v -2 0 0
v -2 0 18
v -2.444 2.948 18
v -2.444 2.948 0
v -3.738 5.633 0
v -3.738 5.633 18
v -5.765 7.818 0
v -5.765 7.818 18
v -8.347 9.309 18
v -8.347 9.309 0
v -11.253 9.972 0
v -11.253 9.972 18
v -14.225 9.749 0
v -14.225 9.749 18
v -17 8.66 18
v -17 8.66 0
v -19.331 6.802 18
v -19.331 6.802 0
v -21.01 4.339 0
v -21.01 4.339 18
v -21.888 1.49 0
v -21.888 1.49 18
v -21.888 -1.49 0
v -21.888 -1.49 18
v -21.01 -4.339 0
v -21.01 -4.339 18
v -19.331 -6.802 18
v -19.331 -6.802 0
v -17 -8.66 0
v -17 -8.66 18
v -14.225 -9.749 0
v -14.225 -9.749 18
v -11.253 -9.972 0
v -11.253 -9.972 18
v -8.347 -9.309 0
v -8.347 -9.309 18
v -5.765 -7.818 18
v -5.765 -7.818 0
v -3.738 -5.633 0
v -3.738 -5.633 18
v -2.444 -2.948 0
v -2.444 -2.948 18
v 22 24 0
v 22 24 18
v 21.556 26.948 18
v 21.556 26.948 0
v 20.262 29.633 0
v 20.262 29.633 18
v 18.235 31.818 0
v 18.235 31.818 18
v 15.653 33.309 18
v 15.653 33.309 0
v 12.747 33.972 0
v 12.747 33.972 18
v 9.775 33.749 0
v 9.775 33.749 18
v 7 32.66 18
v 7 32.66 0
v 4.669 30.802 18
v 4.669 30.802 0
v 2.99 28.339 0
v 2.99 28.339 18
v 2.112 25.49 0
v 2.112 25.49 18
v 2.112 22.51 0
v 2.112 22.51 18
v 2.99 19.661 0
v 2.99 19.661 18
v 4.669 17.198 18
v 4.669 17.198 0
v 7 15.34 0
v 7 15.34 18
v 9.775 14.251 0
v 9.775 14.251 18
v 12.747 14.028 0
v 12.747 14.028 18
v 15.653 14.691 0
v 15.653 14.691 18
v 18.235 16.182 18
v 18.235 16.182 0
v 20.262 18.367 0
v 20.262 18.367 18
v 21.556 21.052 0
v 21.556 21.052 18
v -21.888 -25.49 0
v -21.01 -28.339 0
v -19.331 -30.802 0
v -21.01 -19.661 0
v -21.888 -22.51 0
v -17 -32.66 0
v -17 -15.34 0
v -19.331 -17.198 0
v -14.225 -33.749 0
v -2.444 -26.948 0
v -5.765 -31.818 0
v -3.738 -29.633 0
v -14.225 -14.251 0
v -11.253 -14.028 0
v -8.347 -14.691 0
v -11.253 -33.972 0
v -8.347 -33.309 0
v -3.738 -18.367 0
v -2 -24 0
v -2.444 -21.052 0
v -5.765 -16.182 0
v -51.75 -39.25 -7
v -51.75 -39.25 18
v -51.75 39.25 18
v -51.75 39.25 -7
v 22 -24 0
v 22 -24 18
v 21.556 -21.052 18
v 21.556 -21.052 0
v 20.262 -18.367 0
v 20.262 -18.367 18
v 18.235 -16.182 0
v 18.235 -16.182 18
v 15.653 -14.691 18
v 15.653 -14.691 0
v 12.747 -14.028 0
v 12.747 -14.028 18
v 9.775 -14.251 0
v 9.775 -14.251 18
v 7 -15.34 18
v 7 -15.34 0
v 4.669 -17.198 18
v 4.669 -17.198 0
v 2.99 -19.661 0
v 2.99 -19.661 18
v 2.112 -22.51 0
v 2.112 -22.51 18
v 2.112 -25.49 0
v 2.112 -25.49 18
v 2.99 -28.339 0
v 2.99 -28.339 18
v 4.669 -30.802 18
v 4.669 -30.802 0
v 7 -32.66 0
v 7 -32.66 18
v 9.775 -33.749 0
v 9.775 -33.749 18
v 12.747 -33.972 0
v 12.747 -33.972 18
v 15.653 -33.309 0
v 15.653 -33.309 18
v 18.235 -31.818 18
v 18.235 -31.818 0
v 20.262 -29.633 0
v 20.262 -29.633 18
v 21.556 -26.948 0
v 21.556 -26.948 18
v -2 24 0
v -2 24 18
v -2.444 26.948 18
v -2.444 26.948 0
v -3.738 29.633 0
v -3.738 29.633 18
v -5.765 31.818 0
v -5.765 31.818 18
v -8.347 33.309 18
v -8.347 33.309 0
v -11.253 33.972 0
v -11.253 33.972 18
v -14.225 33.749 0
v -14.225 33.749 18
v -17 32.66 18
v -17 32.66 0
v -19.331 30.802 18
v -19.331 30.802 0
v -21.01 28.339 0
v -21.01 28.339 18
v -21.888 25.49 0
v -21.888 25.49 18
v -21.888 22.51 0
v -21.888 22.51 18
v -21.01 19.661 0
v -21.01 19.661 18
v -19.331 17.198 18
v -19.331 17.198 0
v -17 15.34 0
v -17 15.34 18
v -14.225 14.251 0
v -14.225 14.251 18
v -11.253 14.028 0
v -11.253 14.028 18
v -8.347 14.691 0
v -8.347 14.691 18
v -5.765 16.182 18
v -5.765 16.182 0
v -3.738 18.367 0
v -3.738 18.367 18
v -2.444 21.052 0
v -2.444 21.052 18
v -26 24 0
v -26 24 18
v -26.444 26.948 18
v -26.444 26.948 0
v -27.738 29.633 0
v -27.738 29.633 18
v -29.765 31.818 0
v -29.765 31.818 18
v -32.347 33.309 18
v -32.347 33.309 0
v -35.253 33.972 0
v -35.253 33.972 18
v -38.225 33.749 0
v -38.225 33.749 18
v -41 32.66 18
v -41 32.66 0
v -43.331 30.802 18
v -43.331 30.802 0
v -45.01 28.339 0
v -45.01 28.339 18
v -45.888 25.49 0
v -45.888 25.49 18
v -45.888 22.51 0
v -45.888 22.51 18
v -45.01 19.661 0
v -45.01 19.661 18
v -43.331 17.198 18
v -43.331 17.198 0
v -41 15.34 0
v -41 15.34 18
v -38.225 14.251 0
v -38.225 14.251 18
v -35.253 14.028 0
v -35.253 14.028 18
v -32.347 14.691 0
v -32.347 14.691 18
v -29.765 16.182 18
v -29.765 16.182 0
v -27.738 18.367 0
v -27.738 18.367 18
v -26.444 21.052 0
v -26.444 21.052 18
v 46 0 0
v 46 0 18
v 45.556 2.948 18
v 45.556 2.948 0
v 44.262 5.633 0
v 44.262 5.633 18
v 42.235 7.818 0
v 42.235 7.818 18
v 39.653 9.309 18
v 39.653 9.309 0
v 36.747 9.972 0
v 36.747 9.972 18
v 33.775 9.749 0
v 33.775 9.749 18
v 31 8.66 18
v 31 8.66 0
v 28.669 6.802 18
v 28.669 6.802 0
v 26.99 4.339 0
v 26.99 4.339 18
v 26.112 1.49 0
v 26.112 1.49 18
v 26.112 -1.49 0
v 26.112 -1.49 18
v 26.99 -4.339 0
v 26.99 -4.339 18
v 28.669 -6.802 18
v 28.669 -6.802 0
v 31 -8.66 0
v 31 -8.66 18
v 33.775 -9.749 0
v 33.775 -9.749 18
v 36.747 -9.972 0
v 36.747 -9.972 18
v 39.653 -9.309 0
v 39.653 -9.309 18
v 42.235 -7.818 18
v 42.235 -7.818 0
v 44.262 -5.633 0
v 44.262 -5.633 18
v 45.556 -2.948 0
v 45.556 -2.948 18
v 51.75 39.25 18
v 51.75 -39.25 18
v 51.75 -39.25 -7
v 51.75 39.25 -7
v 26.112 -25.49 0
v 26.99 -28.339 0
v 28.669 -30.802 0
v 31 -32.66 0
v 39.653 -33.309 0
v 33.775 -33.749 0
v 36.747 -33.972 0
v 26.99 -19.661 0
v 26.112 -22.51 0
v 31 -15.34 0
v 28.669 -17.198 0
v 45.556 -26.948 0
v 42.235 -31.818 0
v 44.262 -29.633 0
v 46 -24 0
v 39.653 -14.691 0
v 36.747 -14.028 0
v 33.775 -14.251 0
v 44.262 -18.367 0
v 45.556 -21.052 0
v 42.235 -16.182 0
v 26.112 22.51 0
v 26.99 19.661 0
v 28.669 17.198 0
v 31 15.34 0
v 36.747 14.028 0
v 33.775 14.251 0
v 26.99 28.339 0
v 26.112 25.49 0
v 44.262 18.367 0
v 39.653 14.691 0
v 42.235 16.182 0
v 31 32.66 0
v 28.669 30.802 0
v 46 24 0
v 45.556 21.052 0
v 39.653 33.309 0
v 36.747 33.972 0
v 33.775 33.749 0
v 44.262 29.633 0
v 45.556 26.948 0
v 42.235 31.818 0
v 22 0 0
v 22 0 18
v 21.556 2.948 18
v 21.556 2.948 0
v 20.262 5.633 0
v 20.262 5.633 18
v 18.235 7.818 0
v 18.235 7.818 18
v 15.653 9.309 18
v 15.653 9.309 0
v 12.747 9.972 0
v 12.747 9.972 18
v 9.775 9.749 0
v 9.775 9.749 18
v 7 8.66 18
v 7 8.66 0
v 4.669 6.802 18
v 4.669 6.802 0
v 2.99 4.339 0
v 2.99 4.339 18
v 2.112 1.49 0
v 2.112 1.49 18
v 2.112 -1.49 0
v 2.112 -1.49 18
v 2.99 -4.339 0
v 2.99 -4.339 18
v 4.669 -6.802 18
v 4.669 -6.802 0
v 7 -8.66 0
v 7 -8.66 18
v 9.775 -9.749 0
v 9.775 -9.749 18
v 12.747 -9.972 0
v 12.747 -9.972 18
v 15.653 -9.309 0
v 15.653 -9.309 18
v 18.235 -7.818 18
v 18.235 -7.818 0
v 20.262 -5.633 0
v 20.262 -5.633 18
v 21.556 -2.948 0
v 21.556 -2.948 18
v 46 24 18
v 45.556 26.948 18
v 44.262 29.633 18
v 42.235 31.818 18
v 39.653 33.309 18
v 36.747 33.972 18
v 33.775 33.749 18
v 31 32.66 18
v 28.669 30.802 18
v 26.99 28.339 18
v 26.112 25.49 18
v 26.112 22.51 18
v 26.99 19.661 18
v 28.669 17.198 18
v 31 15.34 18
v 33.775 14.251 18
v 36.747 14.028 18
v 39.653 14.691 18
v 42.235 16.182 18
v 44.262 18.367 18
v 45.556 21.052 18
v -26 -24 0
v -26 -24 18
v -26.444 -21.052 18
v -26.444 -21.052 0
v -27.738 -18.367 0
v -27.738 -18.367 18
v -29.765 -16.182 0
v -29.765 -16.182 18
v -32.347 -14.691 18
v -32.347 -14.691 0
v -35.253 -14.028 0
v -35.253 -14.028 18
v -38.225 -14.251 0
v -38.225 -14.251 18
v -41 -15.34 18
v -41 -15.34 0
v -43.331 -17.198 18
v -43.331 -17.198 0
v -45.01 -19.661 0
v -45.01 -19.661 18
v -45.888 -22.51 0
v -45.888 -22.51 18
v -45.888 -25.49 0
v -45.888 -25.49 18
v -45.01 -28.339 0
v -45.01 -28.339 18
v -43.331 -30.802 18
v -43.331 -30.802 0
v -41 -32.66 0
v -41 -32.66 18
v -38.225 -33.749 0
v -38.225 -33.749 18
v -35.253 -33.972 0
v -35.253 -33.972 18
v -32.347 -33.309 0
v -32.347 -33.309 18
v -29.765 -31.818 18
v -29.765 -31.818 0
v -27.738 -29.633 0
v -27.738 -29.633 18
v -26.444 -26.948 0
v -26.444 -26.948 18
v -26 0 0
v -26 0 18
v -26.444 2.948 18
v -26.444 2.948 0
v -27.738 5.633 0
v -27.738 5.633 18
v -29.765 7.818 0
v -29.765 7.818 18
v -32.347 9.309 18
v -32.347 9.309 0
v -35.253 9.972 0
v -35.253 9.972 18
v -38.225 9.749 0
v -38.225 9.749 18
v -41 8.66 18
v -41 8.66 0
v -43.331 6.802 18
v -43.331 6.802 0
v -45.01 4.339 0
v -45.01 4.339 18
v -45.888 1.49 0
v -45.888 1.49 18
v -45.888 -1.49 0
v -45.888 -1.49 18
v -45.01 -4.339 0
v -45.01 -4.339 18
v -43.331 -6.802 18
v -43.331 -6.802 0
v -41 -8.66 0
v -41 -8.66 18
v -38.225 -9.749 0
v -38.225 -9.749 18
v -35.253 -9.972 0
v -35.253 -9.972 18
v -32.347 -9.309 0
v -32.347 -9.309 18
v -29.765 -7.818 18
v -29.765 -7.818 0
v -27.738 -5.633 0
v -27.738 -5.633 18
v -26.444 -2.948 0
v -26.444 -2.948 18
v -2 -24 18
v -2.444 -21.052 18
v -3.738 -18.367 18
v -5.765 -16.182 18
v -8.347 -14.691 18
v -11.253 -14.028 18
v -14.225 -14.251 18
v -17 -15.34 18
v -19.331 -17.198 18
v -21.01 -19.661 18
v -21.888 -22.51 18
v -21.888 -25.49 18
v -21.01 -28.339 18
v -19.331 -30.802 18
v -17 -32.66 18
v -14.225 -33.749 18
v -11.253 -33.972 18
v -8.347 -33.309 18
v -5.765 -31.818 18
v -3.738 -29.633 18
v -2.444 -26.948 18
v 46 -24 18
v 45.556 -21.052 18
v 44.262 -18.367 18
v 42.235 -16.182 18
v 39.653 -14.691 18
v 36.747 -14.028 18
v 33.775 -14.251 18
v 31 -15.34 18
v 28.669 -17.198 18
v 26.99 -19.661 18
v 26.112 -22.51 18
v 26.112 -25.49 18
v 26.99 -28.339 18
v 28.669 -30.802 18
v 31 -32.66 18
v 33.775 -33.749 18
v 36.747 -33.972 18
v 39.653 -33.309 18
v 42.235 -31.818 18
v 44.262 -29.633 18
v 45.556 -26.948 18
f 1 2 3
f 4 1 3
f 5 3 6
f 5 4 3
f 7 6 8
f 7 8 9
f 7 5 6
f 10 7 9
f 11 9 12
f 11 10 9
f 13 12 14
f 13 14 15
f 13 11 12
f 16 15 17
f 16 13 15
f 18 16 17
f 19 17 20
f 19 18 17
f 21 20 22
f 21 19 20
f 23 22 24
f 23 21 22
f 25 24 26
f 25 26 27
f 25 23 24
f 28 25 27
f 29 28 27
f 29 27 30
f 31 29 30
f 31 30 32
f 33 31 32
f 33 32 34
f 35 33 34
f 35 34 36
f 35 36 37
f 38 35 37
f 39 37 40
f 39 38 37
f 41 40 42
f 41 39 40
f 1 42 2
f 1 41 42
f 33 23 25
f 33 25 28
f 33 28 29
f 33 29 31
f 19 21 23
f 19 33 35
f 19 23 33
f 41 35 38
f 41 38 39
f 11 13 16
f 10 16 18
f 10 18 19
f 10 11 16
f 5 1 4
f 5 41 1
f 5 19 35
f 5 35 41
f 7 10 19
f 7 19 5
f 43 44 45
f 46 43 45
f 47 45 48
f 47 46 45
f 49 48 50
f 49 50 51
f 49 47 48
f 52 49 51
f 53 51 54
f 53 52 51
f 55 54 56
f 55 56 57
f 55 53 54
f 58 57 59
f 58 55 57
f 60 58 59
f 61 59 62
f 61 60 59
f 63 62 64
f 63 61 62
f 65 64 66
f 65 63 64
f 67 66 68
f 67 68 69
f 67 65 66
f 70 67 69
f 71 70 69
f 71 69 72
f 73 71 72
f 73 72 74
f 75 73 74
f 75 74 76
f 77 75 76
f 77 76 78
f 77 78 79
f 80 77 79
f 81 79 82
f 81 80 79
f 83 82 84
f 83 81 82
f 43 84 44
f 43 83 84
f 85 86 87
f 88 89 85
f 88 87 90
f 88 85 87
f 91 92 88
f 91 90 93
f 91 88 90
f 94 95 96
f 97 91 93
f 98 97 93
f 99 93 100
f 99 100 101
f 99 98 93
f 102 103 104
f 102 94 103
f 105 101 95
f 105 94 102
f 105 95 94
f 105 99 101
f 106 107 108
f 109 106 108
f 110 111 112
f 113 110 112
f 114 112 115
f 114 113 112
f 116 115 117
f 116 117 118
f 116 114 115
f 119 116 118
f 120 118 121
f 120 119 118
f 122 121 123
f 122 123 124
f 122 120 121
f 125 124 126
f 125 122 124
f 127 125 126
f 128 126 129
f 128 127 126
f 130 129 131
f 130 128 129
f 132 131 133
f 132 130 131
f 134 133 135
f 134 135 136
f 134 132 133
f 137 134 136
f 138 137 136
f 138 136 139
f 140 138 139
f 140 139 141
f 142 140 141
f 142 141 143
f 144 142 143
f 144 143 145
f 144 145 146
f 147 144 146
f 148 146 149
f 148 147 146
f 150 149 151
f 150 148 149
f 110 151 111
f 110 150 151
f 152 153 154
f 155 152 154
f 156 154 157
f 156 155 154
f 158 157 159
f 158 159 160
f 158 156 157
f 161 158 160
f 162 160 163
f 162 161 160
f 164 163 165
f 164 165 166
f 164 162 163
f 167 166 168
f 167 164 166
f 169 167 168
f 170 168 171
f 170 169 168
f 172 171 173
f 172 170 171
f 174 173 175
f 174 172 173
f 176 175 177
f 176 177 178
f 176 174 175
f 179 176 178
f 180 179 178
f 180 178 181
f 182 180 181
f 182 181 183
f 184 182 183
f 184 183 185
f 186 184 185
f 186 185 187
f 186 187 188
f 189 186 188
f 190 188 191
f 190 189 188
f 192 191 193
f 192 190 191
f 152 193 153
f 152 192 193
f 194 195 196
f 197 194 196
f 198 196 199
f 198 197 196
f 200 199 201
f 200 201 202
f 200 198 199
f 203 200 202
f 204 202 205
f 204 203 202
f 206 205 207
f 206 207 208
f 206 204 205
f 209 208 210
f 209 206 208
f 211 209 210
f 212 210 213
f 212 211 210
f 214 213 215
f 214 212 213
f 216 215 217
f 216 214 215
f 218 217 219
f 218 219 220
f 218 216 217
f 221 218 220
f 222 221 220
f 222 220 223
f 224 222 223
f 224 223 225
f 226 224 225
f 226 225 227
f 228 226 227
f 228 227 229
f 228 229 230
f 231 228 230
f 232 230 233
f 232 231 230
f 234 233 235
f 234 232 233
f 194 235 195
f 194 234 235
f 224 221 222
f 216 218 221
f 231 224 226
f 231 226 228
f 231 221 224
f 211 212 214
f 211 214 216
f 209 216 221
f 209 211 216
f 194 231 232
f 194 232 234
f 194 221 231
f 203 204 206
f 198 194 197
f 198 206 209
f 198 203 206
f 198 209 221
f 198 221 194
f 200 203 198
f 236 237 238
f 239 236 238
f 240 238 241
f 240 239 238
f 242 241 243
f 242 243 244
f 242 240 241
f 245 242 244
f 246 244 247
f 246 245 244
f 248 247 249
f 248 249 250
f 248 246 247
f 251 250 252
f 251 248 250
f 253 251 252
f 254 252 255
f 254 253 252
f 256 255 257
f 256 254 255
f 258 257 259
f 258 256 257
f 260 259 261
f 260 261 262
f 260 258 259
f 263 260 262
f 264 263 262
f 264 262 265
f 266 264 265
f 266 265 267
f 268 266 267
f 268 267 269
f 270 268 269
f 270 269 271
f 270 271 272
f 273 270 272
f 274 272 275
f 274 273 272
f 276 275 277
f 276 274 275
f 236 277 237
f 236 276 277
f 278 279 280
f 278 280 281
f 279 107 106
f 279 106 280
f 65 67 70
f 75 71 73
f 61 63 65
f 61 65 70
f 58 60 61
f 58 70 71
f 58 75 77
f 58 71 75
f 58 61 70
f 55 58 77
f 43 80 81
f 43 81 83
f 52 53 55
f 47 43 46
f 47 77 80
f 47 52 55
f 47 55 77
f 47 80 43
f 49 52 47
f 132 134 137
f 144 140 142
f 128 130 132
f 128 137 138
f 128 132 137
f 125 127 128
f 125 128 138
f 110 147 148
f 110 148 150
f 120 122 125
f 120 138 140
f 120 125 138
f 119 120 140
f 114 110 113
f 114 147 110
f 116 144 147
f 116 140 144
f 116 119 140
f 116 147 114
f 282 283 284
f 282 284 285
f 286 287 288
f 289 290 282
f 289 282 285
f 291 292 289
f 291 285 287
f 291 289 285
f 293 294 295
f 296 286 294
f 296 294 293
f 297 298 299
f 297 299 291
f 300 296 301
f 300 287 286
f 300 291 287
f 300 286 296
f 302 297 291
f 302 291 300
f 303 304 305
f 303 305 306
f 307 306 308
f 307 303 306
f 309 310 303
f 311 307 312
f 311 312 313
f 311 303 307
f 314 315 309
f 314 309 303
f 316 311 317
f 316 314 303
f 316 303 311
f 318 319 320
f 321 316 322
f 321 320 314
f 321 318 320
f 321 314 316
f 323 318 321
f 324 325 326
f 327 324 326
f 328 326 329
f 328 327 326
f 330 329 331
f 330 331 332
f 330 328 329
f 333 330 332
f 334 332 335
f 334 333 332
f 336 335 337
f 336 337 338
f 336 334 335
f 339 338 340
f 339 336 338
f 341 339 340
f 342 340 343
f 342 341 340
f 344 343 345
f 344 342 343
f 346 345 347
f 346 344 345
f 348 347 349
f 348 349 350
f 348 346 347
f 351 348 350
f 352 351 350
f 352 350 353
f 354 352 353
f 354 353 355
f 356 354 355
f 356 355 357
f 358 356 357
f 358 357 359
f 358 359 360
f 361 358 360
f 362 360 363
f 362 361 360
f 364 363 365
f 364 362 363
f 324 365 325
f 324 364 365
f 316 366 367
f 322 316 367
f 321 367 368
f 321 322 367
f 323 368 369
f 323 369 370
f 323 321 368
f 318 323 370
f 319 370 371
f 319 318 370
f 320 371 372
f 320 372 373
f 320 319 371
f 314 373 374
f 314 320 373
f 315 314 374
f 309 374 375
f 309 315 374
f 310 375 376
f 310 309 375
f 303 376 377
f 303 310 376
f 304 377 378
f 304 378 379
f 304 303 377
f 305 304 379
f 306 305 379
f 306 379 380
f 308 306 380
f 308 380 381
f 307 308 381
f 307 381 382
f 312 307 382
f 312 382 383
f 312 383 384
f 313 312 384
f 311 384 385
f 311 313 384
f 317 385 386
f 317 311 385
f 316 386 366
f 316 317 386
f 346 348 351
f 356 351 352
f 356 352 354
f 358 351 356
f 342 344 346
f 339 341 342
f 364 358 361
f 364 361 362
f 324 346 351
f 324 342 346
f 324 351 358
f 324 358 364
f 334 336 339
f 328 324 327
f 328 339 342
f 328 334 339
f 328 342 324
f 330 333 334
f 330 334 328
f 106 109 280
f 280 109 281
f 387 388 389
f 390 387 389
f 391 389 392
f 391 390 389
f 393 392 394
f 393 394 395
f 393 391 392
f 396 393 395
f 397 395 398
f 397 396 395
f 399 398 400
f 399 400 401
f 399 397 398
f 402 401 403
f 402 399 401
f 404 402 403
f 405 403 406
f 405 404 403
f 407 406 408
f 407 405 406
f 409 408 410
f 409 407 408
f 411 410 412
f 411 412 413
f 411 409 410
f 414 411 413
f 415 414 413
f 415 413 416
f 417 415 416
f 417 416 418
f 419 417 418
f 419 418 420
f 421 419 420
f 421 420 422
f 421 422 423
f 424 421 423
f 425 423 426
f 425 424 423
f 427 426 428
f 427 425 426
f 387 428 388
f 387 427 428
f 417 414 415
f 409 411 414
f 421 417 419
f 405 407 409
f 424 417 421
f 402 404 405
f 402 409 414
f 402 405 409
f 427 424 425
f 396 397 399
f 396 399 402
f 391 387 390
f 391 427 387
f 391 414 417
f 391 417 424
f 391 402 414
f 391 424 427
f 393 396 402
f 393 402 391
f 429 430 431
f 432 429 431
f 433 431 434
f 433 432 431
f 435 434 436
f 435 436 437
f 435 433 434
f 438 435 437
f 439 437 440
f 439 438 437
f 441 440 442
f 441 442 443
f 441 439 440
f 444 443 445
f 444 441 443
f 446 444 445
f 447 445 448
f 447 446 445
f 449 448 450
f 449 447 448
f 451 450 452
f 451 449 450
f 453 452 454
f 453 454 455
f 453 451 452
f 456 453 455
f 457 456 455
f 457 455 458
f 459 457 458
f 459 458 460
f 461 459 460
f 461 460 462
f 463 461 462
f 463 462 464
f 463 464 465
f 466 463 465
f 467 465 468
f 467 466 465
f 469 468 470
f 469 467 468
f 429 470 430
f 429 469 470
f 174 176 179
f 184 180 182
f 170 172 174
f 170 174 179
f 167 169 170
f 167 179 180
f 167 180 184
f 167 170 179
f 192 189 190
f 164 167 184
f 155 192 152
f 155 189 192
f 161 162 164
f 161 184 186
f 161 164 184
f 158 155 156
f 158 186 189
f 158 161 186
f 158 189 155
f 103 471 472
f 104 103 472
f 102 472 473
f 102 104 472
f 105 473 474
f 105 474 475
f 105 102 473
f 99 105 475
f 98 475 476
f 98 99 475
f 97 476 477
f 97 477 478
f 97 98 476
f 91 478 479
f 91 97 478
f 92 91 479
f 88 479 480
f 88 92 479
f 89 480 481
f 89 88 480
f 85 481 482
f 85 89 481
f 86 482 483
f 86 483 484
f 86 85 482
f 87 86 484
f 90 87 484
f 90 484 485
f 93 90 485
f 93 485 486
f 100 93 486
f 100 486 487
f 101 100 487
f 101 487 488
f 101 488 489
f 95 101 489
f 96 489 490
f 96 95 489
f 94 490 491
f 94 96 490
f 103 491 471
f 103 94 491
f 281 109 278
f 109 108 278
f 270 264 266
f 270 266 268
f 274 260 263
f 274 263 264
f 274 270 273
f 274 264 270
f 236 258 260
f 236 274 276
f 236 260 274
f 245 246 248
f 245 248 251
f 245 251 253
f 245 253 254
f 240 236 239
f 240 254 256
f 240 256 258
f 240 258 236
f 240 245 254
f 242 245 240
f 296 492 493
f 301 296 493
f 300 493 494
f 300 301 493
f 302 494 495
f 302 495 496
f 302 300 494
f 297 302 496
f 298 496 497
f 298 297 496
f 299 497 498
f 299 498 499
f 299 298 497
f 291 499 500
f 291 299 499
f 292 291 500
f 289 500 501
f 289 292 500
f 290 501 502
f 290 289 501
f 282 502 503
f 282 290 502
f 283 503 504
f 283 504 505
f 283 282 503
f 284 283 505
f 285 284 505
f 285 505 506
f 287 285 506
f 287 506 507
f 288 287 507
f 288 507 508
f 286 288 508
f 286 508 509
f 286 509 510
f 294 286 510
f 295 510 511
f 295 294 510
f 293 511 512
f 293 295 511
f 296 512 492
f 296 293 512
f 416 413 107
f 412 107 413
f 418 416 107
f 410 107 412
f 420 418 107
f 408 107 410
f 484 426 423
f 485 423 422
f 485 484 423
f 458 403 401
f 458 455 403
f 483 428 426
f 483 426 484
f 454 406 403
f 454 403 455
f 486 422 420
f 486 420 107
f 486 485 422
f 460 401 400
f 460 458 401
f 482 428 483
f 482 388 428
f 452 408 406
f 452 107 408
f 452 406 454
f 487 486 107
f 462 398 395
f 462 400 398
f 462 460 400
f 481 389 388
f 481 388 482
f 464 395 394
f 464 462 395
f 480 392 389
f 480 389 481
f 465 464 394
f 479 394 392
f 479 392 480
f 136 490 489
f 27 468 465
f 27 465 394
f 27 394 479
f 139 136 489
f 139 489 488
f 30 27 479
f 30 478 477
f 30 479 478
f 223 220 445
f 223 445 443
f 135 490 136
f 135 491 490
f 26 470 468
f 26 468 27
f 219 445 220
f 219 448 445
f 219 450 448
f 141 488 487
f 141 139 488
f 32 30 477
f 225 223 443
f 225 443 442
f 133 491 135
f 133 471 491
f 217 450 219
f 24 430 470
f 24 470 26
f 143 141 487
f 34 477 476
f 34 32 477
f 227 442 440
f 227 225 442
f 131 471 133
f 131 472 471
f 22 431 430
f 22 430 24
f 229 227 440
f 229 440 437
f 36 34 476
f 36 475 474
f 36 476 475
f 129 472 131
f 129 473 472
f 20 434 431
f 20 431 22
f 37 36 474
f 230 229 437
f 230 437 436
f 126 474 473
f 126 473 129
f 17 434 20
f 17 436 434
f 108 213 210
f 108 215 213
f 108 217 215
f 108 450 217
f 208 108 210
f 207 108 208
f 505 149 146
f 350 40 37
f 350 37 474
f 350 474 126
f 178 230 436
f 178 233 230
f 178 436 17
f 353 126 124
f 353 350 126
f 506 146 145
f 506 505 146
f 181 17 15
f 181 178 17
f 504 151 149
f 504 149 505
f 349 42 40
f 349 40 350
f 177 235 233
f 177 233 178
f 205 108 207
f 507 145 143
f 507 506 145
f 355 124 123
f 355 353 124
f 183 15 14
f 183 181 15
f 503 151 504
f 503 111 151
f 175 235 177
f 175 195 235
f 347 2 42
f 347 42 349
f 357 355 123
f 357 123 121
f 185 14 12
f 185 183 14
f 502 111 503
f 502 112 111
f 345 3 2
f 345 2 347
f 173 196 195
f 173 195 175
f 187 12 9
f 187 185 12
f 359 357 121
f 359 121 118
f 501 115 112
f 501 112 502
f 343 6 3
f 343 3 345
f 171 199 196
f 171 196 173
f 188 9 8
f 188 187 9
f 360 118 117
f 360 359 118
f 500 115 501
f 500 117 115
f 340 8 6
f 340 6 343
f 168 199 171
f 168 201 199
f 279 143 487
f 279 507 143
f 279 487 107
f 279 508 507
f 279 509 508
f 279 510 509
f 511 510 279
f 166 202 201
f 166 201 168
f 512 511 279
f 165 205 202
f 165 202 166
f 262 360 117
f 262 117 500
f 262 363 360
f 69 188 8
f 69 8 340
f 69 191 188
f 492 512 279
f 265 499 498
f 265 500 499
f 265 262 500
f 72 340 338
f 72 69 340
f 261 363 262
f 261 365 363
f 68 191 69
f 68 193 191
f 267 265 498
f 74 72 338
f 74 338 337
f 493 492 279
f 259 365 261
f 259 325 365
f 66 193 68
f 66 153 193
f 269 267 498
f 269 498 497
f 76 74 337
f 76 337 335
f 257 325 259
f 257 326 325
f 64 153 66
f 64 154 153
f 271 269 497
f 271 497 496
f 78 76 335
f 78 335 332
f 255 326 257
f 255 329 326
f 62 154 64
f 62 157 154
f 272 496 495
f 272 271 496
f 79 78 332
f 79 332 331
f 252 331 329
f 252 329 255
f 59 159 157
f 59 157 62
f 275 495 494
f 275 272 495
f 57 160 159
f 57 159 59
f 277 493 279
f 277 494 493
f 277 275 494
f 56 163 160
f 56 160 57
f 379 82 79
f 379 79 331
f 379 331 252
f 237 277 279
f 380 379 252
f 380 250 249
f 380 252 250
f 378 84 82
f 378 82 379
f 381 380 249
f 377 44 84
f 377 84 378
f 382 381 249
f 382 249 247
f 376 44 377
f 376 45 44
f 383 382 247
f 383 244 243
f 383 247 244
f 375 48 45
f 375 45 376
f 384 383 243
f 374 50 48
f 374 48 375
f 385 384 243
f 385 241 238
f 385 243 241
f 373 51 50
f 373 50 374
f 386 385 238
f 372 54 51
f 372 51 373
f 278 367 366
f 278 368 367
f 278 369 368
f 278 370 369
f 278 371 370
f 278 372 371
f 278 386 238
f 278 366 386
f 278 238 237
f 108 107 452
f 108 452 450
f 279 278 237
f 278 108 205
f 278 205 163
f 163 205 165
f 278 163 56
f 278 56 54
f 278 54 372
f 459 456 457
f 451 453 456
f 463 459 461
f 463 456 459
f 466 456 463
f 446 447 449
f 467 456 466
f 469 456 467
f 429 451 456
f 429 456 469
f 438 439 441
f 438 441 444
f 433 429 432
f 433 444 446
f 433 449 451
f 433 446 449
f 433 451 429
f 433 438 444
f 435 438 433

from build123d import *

# Parameters (mm, degrees)
F0_W     = 103.5
F0_H     = 78.5
F0_R     = 10
F1_DEPTH = 18
F2_DEPTH = 7


with BuildPart() as f1:
    # F0 (on Top) → F1 (new body)
    with BuildSketch(Plane.XY):
        Rectangle(F0_W, F0_H)
        with Locations((-36, -24)):
            Circle(F0_R, mode=Mode.SUBTRACT)
        with Locations((-12, -24)):
            Circle(F0_R, mode=Mode.SUBTRACT)
        with Locations((12, -24)):
            Circle(F0_R, mode=Mode.SUBTRACT)
        with Locations((36, -24)):
            Circle(F0_R, mode=Mode.SUBTRACT)
        with Locations((-36, 0)):
            Circle(F0_R, mode=Mode.SUBTRACT)
        with Locations((-12, 0)):
            Circle(F0_R, mode=Mode.SUBTRACT)
        with Locations((-36, 24)):
            Circle(F0_R, mode=Mode.SUBTRACT)
        with Locations((-12, 24)):
            Circle(F0_R, mode=Mode.SUBTRACT)
        with Locations((12, 0)):
            Circle(F0_R, mode=Mode.SUBTRACT)
        with Locations((36, 0)):
            Circle(F0_R, mode=Mode.SUBTRACT)
        with Locations((12, 24)):
            Circle(F0_R, mode=Mode.SUBTRACT)
        with Locations((36, 24)):
            Circle(F0_R, mode=Mode.SUBTRACT)
    extrude(amount=F1_DEPTH)

    # F0 (on Top) → F2 (join)
    with BuildSketch(Plane.XY):
        Rectangle(F0_W, F0_H)
        with Locations((-36, -24)):
            Circle(F0_R, mode=Mode.SUBTRACT)
        with Locations((-12, -24)):
            Circle(F0_R, mode=Mode.SUBTRACT)
        with Locations((12, -24)):
            Circle(F0_R, mode=Mode.SUBTRACT)
        with Locations((36, -24)):
            Circle(F0_R, mode=Mode.SUBTRACT)
        with Locations((-36, 0)):
            Circle(F0_R, mode=Mode.SUBTRACT)
        with Locations((-12, 0)):
            Circle(F0_R, mode=Mode.SUBTRACT)
        with Locations((-36, 24)):
            Circle(F0_R, mode=Mode.SUBTRACT)
        with Locations((-12, 24)):
            Circle(F0_R, mode=Mode.SUBTRACT)
        with Locations((12, 0)):
            Circle(F0_R, mode=Mode.SUBTRACT)
        with Locations((36, 0)):
            Circle(F0_R, mode=Mode.SUBTRACT)
        with Locations((12, 24)):
            Circle(F0_R, mode=Mode.SUBTRACT)
        with Locations((36, 24)):
            Circle(F0_R, mode=Mode.SUBTRACT)
        with Locations((-36, -24)):
            Circle(F0_R)
        with Locations((-12, -24)):
            Circle(F0_R)
        with Locations((12, -24)):
            Circle(F0_R)
        with Locations((36, -24)):
            Circle(F0_R)
        with Locations((12, 0)):
            Circle(F0_R)
        with Locations((-12, 0)):
            Circle(F0_R)
        with Locations((-36, 0)):
            Circle(F0_R)
        with Locations((-36, 24)):
            Circle(F0_R)
        with Locations((-12, 24)):
            Circle(F0_R)
        with Locations((12, 24)):
            Circle(F0_R)
        with Locations((36, 24)):
            Circle(F0_R)
        with Locations((36, 0)):
            Circle(F0_R)
    extrude(amount=-F2_DEPTH)


solid = f1.part
